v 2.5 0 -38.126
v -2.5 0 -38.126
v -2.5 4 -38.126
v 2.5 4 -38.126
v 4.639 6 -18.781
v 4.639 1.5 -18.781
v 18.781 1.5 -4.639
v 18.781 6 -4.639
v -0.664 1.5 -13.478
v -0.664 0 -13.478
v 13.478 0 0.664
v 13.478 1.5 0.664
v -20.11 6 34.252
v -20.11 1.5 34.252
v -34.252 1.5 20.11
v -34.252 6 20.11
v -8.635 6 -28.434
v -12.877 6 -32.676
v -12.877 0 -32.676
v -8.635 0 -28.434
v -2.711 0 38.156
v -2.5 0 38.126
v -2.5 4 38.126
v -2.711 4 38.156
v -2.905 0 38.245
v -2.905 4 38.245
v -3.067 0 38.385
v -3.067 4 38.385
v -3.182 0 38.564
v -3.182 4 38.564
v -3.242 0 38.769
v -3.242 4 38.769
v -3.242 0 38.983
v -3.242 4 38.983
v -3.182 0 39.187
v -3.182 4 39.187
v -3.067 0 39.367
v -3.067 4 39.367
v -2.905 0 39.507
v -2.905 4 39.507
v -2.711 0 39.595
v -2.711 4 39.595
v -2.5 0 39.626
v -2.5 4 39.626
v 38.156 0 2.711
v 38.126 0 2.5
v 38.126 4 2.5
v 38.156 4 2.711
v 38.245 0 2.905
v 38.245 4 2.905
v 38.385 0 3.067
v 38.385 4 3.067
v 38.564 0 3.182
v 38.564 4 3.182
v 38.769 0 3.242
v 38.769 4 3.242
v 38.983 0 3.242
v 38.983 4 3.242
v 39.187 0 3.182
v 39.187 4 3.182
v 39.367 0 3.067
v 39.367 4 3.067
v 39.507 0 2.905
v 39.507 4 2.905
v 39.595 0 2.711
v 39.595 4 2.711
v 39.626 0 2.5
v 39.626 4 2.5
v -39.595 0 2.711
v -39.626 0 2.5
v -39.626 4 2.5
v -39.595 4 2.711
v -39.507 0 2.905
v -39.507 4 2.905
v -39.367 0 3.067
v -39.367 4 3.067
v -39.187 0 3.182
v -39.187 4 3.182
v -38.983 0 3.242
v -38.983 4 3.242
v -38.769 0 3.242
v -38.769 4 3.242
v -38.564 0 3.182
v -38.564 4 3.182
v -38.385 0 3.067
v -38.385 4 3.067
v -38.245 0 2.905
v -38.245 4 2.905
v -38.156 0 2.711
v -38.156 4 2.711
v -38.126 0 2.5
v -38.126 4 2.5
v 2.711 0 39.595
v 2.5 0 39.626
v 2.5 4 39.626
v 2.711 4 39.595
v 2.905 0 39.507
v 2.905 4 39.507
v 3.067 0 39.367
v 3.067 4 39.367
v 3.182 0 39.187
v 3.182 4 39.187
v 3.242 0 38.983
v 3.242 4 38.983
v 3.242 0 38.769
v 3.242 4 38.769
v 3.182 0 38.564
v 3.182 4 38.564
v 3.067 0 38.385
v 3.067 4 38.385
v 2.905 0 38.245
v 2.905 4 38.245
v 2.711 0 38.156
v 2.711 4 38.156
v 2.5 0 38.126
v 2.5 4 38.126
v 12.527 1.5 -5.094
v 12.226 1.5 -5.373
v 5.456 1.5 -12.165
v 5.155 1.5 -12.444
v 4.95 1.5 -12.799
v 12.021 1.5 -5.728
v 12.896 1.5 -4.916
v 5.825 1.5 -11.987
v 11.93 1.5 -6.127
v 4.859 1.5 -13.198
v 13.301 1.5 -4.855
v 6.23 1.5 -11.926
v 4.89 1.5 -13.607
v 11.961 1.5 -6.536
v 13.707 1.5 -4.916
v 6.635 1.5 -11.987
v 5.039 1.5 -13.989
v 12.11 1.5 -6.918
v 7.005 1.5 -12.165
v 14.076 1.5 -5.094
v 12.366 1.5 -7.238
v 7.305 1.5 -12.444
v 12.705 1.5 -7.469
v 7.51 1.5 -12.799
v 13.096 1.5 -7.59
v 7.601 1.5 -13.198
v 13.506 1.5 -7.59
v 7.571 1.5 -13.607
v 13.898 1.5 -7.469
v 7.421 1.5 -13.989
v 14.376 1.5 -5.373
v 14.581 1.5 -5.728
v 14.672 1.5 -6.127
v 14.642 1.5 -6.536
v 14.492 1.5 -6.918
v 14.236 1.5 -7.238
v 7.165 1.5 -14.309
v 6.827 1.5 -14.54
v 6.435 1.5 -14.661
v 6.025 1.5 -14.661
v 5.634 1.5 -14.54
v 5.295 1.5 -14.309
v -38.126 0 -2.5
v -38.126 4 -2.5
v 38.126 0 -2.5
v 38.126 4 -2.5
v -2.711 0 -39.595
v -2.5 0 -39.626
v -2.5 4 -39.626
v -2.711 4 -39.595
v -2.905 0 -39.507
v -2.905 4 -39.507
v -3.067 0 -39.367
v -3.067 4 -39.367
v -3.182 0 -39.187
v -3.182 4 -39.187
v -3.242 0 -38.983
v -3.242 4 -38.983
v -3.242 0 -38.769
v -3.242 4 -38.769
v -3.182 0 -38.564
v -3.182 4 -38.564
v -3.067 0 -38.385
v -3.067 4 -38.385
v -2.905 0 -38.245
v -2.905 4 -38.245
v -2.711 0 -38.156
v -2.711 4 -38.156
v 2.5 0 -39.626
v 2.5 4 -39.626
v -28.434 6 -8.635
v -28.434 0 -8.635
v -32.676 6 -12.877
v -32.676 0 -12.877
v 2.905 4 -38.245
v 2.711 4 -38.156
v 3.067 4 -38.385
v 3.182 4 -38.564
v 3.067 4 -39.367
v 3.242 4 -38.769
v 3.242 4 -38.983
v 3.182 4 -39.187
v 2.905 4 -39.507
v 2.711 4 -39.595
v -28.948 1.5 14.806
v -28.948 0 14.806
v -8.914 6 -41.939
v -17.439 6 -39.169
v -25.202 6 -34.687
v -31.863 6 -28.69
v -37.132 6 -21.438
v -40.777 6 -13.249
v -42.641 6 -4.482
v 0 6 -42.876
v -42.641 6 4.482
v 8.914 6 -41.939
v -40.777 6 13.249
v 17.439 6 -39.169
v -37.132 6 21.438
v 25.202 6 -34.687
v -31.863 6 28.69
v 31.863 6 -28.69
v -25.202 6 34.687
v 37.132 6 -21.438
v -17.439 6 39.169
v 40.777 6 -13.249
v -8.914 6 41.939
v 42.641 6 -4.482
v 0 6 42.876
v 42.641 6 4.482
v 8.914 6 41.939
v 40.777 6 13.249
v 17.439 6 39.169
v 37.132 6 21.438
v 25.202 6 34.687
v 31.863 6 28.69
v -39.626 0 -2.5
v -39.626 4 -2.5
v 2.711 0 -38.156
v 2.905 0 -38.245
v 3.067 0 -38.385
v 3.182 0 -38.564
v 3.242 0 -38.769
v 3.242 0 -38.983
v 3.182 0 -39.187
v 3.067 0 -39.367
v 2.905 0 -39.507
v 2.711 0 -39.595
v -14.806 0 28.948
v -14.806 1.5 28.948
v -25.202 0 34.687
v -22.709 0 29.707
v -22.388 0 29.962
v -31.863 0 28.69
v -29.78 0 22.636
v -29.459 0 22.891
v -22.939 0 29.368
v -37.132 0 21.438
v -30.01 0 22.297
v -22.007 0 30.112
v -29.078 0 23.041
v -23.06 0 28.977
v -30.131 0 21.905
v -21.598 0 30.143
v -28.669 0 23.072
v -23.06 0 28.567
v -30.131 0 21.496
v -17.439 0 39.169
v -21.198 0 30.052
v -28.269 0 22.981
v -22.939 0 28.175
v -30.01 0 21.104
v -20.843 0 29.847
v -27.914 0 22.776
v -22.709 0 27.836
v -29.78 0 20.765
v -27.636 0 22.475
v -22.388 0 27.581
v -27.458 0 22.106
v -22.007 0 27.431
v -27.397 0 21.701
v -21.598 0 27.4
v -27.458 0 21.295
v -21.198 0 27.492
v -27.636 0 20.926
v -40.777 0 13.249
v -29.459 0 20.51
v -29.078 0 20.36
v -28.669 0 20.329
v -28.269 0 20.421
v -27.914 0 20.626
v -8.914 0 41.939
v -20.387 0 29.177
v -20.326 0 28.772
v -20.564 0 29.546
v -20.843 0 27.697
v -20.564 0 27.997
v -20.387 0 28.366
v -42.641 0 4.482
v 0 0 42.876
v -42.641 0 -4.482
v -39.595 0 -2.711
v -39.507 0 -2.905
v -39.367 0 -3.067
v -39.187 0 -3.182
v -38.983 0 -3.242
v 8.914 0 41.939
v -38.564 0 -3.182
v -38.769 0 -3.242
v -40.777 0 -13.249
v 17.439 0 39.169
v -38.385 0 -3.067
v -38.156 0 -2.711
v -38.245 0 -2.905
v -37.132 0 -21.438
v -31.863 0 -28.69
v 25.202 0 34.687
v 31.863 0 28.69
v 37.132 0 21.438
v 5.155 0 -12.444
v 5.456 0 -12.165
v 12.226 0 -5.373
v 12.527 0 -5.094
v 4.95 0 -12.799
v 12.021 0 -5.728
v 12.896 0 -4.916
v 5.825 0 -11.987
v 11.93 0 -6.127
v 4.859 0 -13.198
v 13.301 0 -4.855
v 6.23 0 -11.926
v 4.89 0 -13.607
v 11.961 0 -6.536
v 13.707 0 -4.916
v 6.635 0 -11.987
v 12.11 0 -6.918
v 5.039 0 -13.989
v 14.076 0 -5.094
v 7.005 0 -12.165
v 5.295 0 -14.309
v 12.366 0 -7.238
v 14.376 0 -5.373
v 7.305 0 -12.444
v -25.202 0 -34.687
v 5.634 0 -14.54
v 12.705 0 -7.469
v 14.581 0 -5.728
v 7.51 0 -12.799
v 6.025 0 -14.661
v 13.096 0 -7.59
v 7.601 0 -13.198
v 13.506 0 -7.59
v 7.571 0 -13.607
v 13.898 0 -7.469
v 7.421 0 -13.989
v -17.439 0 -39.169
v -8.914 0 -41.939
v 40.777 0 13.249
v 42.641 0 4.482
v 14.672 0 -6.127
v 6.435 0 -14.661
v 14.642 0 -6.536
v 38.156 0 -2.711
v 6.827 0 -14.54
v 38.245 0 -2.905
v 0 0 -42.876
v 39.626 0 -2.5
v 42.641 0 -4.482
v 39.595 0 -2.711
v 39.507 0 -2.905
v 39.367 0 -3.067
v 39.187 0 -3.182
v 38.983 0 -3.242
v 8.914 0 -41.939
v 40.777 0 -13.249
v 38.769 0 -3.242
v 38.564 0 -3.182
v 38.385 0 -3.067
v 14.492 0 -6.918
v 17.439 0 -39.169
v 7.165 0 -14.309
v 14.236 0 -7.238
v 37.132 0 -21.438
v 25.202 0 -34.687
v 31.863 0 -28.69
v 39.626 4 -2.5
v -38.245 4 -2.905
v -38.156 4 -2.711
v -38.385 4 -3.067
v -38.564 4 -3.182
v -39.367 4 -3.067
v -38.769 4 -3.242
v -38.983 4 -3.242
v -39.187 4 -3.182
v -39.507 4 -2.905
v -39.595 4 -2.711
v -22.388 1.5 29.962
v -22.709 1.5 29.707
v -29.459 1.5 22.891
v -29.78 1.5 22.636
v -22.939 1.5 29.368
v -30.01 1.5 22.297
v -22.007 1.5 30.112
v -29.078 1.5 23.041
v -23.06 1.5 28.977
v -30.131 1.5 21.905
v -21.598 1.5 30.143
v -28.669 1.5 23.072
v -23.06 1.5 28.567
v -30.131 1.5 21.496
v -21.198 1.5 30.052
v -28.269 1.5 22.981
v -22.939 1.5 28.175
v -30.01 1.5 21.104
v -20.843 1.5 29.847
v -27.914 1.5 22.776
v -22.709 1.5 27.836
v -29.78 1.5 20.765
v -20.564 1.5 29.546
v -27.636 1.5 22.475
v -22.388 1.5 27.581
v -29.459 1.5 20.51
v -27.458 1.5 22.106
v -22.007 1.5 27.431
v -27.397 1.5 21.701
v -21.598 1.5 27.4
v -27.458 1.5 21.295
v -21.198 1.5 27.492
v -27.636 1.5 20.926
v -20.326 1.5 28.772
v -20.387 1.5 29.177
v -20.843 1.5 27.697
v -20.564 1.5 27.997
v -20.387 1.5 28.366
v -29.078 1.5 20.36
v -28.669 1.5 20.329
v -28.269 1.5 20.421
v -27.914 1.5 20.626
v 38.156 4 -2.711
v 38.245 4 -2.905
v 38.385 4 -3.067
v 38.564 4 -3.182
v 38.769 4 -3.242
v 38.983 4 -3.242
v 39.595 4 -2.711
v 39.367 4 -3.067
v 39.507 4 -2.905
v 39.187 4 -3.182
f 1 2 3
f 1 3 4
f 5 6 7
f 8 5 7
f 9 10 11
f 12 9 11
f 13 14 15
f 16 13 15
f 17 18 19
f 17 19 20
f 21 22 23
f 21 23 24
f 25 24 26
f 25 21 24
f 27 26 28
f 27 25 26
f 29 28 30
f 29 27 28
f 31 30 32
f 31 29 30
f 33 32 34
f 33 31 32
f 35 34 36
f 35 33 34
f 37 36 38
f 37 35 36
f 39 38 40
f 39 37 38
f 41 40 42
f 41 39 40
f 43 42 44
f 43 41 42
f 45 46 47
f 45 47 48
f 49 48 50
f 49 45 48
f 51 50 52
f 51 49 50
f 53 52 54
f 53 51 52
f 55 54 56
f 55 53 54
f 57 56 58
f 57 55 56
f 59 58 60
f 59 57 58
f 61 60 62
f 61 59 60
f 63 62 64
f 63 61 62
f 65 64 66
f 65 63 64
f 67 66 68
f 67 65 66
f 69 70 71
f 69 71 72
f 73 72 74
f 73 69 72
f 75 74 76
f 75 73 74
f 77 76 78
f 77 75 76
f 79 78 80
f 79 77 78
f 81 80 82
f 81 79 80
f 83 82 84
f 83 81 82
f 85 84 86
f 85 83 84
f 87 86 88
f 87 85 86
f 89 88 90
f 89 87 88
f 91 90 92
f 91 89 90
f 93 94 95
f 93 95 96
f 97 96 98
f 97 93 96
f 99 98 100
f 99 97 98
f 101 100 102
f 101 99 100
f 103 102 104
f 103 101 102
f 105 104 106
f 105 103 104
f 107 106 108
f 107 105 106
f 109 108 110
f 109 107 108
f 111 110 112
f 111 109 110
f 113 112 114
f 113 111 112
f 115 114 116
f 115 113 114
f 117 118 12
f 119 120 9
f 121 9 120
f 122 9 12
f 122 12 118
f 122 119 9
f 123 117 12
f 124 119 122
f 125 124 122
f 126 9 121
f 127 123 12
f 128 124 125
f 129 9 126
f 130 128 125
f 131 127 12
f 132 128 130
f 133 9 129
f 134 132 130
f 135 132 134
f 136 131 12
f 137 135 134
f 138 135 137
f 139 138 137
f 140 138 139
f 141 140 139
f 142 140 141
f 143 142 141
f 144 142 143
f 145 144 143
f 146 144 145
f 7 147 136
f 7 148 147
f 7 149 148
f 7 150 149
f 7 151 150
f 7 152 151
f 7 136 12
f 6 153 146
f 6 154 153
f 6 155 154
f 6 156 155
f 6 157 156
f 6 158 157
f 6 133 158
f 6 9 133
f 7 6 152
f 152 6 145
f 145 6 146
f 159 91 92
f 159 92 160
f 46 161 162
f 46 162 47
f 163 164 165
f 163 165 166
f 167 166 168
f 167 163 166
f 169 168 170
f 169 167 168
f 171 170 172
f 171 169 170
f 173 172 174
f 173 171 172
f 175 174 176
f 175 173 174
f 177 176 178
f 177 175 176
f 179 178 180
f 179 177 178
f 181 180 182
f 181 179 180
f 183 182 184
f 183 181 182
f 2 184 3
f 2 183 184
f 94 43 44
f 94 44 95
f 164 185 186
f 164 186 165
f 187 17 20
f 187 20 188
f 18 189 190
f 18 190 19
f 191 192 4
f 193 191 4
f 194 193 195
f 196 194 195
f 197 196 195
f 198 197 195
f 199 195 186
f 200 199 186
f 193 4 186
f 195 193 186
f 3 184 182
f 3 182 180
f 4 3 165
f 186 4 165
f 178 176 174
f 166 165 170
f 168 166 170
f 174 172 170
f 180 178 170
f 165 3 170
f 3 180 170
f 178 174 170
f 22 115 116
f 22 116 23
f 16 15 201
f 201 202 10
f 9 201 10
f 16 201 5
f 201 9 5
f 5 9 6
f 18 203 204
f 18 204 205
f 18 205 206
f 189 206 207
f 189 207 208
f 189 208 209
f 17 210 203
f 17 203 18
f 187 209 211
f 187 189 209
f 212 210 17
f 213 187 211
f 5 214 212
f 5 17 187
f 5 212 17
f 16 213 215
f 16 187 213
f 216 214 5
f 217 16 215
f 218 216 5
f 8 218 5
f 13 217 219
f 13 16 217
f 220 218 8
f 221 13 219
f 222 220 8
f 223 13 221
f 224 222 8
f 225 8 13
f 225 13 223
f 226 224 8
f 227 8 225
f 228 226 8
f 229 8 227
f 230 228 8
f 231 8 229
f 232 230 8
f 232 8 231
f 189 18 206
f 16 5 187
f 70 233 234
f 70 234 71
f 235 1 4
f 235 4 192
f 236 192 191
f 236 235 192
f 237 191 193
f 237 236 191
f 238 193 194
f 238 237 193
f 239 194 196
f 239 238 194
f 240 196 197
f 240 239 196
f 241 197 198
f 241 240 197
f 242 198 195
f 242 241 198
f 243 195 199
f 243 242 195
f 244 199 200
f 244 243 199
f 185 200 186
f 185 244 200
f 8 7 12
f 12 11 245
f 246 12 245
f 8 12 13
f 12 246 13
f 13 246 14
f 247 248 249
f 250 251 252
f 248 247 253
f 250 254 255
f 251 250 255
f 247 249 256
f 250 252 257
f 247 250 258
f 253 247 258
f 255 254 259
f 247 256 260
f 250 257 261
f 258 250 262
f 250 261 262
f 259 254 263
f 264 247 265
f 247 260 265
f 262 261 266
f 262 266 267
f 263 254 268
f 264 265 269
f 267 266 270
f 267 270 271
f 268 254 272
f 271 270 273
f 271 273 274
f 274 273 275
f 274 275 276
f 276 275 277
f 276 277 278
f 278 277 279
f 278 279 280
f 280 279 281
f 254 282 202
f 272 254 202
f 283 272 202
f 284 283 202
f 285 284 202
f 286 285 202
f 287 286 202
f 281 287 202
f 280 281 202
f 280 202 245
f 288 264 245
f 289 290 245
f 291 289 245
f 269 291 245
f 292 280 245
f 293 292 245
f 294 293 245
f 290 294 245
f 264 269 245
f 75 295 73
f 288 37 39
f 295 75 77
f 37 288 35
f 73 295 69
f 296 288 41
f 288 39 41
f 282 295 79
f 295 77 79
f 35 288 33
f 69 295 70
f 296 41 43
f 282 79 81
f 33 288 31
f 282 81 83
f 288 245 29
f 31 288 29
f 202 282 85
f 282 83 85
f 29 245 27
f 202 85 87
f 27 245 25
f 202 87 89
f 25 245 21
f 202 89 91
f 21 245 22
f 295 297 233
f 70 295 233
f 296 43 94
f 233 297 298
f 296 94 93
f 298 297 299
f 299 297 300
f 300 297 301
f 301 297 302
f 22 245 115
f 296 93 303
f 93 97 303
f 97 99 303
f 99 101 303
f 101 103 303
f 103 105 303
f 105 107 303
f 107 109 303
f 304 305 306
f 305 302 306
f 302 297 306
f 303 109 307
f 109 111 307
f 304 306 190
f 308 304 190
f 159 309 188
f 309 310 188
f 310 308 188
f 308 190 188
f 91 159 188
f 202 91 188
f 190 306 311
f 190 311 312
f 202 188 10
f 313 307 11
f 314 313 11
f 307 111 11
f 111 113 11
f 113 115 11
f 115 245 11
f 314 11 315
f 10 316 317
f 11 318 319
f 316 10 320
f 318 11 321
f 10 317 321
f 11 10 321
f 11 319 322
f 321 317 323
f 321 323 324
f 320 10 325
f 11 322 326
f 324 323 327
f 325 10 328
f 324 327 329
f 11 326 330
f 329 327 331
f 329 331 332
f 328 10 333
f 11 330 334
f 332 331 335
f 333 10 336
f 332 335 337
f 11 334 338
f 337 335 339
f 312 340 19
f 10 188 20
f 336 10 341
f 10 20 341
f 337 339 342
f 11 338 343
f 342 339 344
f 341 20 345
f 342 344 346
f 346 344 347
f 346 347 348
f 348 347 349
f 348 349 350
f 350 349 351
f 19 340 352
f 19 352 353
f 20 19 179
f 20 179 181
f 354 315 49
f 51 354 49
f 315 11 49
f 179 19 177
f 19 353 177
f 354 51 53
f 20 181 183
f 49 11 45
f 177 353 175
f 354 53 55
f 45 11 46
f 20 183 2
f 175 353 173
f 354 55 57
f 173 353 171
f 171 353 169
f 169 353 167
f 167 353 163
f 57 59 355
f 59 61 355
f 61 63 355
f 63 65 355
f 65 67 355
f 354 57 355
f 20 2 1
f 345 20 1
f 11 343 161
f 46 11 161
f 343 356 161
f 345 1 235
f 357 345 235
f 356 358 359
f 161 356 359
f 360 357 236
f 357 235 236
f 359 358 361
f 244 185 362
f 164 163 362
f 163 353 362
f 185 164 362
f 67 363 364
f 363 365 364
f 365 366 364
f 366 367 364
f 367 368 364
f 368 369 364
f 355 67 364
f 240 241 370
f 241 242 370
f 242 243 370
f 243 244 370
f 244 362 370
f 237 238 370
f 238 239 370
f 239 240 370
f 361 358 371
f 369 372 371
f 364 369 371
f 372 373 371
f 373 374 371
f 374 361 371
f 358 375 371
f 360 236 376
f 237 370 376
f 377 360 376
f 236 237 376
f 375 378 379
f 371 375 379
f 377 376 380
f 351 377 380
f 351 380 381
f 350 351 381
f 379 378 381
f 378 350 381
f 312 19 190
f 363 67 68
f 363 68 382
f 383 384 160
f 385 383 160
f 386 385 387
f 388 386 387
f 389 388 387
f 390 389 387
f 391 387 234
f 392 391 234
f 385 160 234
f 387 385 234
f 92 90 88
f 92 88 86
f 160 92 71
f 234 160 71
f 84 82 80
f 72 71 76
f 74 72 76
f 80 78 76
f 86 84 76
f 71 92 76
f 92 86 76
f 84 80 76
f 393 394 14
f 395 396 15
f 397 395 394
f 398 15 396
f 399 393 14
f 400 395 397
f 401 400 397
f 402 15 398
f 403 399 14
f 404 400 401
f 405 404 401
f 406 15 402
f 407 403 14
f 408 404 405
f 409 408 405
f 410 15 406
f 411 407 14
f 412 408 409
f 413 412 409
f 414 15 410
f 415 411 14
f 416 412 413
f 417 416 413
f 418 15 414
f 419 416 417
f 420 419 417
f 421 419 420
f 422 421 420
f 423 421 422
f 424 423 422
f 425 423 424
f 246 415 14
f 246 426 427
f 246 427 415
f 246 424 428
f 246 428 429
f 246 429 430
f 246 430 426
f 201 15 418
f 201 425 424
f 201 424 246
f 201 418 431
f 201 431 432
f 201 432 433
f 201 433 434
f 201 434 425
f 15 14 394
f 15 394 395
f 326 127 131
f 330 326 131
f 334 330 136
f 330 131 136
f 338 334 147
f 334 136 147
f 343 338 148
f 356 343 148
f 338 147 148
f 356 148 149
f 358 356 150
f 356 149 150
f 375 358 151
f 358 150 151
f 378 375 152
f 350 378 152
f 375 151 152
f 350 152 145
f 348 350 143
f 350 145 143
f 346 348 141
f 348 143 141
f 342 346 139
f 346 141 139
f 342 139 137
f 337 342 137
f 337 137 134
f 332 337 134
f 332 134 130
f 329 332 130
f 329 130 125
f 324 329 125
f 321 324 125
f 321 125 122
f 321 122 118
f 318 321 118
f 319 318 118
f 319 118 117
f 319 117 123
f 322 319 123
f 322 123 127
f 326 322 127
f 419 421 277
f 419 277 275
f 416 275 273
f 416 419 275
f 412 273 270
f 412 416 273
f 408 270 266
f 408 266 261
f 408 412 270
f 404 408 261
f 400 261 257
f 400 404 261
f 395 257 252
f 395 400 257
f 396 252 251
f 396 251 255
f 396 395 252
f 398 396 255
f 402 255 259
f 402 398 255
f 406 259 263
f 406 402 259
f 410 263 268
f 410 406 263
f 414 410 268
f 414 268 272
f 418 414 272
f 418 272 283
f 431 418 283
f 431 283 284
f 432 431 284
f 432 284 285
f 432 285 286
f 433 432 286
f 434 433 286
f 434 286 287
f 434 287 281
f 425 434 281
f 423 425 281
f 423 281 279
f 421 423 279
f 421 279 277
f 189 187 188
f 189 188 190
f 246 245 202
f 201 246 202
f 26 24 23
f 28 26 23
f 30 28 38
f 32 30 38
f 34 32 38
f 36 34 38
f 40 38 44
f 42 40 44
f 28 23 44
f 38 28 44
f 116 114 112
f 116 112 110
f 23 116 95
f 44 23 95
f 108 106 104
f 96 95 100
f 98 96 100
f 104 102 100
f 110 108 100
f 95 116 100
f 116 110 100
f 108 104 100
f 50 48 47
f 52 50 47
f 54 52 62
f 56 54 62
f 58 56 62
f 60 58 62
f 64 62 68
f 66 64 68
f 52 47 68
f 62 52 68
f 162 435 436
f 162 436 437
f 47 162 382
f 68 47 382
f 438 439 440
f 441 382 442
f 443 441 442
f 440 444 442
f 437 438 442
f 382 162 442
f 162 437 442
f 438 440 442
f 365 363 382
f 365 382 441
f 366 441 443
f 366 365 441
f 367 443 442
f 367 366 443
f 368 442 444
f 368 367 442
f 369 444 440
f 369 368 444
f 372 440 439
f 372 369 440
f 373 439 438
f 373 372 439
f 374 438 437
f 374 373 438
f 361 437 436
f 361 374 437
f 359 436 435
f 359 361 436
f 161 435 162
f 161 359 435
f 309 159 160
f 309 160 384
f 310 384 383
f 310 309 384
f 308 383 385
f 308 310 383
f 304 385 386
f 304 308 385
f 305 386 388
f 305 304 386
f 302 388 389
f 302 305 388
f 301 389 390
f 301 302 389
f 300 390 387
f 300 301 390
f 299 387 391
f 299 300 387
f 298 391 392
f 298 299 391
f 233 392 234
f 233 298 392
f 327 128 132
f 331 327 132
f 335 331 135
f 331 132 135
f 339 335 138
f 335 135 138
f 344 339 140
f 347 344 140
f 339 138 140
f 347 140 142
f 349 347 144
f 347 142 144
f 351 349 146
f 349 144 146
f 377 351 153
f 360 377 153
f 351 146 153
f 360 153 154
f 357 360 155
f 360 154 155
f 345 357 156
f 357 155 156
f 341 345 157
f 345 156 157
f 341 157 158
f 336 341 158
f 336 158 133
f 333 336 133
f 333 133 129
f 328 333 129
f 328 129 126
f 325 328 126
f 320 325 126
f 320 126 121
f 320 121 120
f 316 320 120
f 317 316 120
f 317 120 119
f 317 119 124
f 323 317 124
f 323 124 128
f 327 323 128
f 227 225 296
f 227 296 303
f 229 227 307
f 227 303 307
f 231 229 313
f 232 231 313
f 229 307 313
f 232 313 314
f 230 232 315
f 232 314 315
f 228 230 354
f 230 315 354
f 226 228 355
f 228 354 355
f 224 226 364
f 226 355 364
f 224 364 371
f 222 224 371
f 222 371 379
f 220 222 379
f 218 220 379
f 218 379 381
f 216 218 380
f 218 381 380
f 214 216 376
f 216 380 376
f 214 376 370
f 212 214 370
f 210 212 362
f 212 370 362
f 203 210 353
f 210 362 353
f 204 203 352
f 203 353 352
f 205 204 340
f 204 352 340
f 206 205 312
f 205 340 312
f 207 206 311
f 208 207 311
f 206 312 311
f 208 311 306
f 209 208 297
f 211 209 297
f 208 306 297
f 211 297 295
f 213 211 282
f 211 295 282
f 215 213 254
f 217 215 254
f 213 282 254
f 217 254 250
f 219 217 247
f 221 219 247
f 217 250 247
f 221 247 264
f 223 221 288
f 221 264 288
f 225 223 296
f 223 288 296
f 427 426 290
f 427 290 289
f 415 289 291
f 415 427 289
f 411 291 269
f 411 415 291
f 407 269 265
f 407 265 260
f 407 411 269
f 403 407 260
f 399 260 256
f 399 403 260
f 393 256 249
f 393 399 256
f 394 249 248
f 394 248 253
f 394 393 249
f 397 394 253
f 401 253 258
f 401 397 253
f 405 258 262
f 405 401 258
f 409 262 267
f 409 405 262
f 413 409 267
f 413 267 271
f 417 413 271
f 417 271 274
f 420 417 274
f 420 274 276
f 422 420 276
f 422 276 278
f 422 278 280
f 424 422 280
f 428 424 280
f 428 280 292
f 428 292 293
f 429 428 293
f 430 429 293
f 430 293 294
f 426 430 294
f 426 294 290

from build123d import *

# Parameters (mm, degrees)
SKETCH1_R           = 42.875795621
BOSS_EXTRUDE1_DEPTH = 6
BOSS_EXTRUDE2_DEPTH = 1.5
CUT_EXTRUDE1_REACH  = 62.932
CUT_EXTRUDE2_DEPTH  = 4
CIRPATTERN1_COUNT   = 4
CUT_EXTRUDE3_REACH  = 62.802
SKETCH5_R           = 1.375


with BuildPart() as part:
    # Sketch1 → Boss-Extrude1 (new body)
    with BuildSketch(Plane(origin=(0, 0, 0), x_dir=(1, 0, 0), z_dir=(0, 1, 0))):
        with Locations(Location((0, 0, 0), (0, 0, 270))):
            Circle(SKETCH1_R)
        Polygon((-20.109572639, -34.251708263), (-34.251708263, -20.109572639), (4.639164702, 18.781300326), (18.781300326, 4.639164702), align=None, mode=Mode.SUBTRACT)
    extrude(amount=BOSS_EXTRUDE1_DEPTH)

    # Sketch1<4> → Boss-Extrude2 (add)
    with BuildSketch(Plane(origin=(0, 0, 0), x_dir=(1, 0, 0), z_dir=(0, 1, 0))):
        Polygon((18.781300326, 4.639164702), (4.639164702, 18.781300326), (-0.664136157, 13.477999467), (13.477999467, -0.664136157), align=None)
        Polygon((-14.80627178, -28.948407404), (-28.948407404, -14.80627178), (-34.251708263, -20.109572639), (-20.109572639, -34.251708263), align=None)
    extrude(amount=BOSS_EXTRUDE2_DEPTH)

    # Sketch2 → Cut-Extrude1 (cut, up to next)
    with BuildSketch(Plane(origin=(0, 6, 0), x_dir=(1, 0, 0), z_dir=(0, 1, 0)), mode=Mode.PRIVATE) as cut_extrude1_sk1:
        Polygon((-32.676453, 12.877463126), (-12.877463126, 32.676453), (-8.634822439, 28.433812313), (-28.433812313, 8.634822439), align=None)
    cut_extrude1_tool1 = extrude(cut_extrude1_sk1.sketch, amount=-CUT_EXTRUDE1_REACH, mode=Mode.PRIVATE) & part.part
    add(cut_extrude1_tool1.solids().sort_by_distance((-20.655638, 6, -20.655638))[0], mode=Mode.SUBTRACT)

    # Sketch3 → Cut-Extrude2 (cut)
    with BuildSketch(Plane.XZ):
        with BuildLine():
            Line((-39.625795621, -2.5), (-39.625795621, 2.5))
            ThreePointArc((-39.625795621, 2.5), (-38.875795621, 3.25), (-38.125795621, 2.5))
            Line((-38.125795621, 2.5), (-38.125795621, -2.5))
            ThreePointArc((-38.125795621, -2.5), (-38.875795621, -3.25), (-39.625795621, -2.5))
        make_face()
    cut_extrude2 = extrude(amount=-CUT_EXTRUDE2_DEPTH, mode=Mode.SUBTRACT)

    # CirPattern1: Cut-Extrude2 ×4 about axis
    cirpattern1_axis = Axis((0, 0, 0), (0, 1, 0))
    for i in range(1, CIRPATTERN1_COUNT):
        add(cut_extrude2.rotate(cirpattern1_axis, i * 360 / CIRPATTERN1_COUNT), mode=Mode.SUBTRACT)

    # Sketch5 → Cut-Extrude3 (cut, up to next)
    with BuildSketch(Plane(origin=(0, 1.5, 0), x_dir=(1, 0, 0), z_dir=(0, 1, 0)), mode=Mode.PRIVATE) as cut_extrude3_sk1:
        with Locations(Location((13.301222772, 6.23015496, 0), (0, 0, 270))):
            Circle(SKETCH5_R)
    cut_extrude3_tool1 = extrude(cut_extrude3_sk1.sketch, amount=-CUT_EXTRUDE3_REACH, mode=Mode.PRIVATE) & part.part
    # Sketch5 → Cut-Extrude3 (cut, up to next)
    with BuildSketch(Plane(origin=(0, 1.5, 0), x_dir=(1, 0, 0), z_dir=(0, 1, 0)), mode=Mode.PRIVATE) as cut_extrude3_sk2:
        with Locations(Location((6.23015496, 13.301222772, 0), (0, 0, 270))):
            Circle(SKETCH5_R)
    cut_extrude3_tool2 = extrude(cut_extrude3_sk2.sketch, amount=-CUT_EXTRUDE3_REACH, mode=Mode.PRIVATE) & part.part
    cut_extrude3_1 = cut_extrude3_tool1.solids().sort_by_distance((13.301223, 1.5, -6.230155))[0]
    add(cut_extrude3_1, mode=Mode.SUBTRACT)
    cut_extrude3_2 = cut_extrude3_tool2.solids().sort_by_distance((6.230155, 1.5, -13.301223))[0]
    add(cut_extrude3_2, mode=Mode.SUBTRACT)
    cut_extrude3 = cut_extrude3_1 + cut_extrude3_2  # Cut-Extrude3 as one shape, for the pattern or mirror that repeats it

    # Mirror1: Cut-Extrude3 across plane
    add(cut_extrude3.mirror(Plane(origin=(-7.735203969, 0, 7.735203969), x_dir=(0.7071067811865474, 0, 0.7071067811865478), z_dir=(-0.7071067811865479, 0, 0.7071067811865472))), mode=Mode.SUBTRACT)


solid = part.part
